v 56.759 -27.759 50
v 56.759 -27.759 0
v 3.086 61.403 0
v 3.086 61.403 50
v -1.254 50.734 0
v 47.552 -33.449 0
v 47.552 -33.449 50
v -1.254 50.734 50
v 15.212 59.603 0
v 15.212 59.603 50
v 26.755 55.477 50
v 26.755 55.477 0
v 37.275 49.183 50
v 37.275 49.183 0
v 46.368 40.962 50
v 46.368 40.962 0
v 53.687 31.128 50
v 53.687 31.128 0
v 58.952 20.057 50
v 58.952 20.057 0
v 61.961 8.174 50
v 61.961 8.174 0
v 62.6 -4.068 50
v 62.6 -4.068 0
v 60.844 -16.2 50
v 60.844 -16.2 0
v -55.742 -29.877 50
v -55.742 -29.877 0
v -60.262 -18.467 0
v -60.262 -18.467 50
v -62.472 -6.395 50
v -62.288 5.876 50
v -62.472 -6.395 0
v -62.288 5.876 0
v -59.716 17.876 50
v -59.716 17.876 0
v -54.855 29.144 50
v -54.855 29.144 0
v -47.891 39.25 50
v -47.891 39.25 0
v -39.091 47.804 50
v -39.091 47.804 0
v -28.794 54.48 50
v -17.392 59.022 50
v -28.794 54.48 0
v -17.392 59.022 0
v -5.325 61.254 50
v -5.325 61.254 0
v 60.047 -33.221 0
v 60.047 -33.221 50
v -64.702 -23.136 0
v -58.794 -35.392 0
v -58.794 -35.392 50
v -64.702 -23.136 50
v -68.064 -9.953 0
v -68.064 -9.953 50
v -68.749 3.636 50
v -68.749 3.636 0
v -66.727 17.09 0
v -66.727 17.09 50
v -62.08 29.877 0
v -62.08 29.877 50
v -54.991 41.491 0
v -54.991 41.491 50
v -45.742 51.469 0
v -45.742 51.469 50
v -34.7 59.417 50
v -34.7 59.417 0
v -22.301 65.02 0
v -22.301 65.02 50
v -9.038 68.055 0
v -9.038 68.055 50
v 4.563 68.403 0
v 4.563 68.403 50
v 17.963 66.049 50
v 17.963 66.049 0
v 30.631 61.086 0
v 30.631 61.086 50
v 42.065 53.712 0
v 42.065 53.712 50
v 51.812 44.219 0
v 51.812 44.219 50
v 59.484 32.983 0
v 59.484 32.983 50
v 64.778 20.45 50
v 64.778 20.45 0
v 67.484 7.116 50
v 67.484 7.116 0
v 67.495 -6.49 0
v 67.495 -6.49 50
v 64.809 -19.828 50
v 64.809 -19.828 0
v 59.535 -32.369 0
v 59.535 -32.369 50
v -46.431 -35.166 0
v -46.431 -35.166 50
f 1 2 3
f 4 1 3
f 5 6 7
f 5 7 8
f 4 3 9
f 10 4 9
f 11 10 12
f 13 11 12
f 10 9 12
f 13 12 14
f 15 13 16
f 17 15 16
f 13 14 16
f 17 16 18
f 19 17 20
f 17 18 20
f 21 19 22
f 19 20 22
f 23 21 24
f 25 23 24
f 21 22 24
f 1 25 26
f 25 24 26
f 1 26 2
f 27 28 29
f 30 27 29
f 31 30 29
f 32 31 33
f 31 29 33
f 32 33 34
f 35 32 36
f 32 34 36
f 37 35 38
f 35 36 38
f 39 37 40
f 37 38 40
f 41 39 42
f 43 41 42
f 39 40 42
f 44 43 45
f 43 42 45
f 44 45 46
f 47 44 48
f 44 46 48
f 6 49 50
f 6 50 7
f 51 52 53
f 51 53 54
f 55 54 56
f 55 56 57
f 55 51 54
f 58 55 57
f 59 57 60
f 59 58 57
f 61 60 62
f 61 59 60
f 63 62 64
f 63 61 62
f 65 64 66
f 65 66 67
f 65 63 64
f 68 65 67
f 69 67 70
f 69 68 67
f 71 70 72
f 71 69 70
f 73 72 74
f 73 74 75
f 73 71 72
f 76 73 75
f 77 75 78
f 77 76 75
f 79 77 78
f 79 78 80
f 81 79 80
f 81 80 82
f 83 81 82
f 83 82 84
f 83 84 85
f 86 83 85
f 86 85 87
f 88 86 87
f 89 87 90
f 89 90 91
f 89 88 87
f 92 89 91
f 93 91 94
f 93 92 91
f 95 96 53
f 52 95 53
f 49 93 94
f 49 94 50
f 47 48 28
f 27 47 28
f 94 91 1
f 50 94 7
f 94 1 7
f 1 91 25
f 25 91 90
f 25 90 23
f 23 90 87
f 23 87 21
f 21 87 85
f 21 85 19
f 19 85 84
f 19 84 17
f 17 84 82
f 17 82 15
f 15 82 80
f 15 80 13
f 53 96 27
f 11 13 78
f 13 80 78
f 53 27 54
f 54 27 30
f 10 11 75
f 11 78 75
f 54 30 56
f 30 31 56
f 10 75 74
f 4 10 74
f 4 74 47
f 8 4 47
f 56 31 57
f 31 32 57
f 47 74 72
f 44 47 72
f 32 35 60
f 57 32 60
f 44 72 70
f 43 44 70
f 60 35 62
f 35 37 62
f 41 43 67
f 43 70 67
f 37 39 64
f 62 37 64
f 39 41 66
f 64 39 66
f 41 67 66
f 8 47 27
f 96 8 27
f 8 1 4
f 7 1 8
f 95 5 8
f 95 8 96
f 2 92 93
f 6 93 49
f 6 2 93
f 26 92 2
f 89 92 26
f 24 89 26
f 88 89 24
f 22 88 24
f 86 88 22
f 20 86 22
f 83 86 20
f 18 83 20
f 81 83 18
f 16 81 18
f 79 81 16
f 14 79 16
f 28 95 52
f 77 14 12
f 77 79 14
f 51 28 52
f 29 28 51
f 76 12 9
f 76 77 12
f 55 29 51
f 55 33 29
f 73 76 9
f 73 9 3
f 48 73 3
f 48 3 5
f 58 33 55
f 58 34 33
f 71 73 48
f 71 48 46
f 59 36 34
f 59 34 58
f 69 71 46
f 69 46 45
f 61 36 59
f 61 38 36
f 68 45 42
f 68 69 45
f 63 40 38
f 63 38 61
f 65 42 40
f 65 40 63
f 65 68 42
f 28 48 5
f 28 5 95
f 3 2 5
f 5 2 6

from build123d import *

# Parameters (mm, degrees)
EXTRUDE_1_DEPTH = 50


with BuildPart() as part:
    # 草图3 → 凸台-拉伸1 (new body)
    with BuildSketch(Plane.XY):
        with BuildLine():
            ThreePointArc((-58.793503257, -35.392156003), (-2.246555748, 68.568474272), (59.534802182, -32.36929731))
            Line((59.534802182, -32.36929731), (60.047257822, -33.220589397))
            Line((60.047257822, -33.220589397), (47.551744298, -33.448918799))
            Line((47.551744298, -33.448918799), (-1.253754565, 50.734372928))
            Line((-1.253754565, 50.734372928), (-46.430511789, -35.166248165))
            Line((-46.430511789, -35.166248165), (-58.793503257, -35.392156003))
        make_face()
        with BuildLine():
            Line((-5.324718346, 61.254350615), (-55.742028798, -29.87652016))
            ThreePointArc((-55.742028798, -29.87652016), (-54.854751969, 29.144492628), (-5.324718346, 61.254350615))
        make_face(mode=Mode.SUBTRACT)
        with BuildLine():
            Line((56.759373511, -27.75875099), (3.086082061, 61.403402212))
            ThreePointArc((3.086082061, 61.403402212), (53.687117349, 31.127868506), (56.759373511, -27.75875099))
        make_face(mode=Mode.SUBTRACT)
    extrude(amount=EXTRUDE_1_DEPTH)


solid = part.part
